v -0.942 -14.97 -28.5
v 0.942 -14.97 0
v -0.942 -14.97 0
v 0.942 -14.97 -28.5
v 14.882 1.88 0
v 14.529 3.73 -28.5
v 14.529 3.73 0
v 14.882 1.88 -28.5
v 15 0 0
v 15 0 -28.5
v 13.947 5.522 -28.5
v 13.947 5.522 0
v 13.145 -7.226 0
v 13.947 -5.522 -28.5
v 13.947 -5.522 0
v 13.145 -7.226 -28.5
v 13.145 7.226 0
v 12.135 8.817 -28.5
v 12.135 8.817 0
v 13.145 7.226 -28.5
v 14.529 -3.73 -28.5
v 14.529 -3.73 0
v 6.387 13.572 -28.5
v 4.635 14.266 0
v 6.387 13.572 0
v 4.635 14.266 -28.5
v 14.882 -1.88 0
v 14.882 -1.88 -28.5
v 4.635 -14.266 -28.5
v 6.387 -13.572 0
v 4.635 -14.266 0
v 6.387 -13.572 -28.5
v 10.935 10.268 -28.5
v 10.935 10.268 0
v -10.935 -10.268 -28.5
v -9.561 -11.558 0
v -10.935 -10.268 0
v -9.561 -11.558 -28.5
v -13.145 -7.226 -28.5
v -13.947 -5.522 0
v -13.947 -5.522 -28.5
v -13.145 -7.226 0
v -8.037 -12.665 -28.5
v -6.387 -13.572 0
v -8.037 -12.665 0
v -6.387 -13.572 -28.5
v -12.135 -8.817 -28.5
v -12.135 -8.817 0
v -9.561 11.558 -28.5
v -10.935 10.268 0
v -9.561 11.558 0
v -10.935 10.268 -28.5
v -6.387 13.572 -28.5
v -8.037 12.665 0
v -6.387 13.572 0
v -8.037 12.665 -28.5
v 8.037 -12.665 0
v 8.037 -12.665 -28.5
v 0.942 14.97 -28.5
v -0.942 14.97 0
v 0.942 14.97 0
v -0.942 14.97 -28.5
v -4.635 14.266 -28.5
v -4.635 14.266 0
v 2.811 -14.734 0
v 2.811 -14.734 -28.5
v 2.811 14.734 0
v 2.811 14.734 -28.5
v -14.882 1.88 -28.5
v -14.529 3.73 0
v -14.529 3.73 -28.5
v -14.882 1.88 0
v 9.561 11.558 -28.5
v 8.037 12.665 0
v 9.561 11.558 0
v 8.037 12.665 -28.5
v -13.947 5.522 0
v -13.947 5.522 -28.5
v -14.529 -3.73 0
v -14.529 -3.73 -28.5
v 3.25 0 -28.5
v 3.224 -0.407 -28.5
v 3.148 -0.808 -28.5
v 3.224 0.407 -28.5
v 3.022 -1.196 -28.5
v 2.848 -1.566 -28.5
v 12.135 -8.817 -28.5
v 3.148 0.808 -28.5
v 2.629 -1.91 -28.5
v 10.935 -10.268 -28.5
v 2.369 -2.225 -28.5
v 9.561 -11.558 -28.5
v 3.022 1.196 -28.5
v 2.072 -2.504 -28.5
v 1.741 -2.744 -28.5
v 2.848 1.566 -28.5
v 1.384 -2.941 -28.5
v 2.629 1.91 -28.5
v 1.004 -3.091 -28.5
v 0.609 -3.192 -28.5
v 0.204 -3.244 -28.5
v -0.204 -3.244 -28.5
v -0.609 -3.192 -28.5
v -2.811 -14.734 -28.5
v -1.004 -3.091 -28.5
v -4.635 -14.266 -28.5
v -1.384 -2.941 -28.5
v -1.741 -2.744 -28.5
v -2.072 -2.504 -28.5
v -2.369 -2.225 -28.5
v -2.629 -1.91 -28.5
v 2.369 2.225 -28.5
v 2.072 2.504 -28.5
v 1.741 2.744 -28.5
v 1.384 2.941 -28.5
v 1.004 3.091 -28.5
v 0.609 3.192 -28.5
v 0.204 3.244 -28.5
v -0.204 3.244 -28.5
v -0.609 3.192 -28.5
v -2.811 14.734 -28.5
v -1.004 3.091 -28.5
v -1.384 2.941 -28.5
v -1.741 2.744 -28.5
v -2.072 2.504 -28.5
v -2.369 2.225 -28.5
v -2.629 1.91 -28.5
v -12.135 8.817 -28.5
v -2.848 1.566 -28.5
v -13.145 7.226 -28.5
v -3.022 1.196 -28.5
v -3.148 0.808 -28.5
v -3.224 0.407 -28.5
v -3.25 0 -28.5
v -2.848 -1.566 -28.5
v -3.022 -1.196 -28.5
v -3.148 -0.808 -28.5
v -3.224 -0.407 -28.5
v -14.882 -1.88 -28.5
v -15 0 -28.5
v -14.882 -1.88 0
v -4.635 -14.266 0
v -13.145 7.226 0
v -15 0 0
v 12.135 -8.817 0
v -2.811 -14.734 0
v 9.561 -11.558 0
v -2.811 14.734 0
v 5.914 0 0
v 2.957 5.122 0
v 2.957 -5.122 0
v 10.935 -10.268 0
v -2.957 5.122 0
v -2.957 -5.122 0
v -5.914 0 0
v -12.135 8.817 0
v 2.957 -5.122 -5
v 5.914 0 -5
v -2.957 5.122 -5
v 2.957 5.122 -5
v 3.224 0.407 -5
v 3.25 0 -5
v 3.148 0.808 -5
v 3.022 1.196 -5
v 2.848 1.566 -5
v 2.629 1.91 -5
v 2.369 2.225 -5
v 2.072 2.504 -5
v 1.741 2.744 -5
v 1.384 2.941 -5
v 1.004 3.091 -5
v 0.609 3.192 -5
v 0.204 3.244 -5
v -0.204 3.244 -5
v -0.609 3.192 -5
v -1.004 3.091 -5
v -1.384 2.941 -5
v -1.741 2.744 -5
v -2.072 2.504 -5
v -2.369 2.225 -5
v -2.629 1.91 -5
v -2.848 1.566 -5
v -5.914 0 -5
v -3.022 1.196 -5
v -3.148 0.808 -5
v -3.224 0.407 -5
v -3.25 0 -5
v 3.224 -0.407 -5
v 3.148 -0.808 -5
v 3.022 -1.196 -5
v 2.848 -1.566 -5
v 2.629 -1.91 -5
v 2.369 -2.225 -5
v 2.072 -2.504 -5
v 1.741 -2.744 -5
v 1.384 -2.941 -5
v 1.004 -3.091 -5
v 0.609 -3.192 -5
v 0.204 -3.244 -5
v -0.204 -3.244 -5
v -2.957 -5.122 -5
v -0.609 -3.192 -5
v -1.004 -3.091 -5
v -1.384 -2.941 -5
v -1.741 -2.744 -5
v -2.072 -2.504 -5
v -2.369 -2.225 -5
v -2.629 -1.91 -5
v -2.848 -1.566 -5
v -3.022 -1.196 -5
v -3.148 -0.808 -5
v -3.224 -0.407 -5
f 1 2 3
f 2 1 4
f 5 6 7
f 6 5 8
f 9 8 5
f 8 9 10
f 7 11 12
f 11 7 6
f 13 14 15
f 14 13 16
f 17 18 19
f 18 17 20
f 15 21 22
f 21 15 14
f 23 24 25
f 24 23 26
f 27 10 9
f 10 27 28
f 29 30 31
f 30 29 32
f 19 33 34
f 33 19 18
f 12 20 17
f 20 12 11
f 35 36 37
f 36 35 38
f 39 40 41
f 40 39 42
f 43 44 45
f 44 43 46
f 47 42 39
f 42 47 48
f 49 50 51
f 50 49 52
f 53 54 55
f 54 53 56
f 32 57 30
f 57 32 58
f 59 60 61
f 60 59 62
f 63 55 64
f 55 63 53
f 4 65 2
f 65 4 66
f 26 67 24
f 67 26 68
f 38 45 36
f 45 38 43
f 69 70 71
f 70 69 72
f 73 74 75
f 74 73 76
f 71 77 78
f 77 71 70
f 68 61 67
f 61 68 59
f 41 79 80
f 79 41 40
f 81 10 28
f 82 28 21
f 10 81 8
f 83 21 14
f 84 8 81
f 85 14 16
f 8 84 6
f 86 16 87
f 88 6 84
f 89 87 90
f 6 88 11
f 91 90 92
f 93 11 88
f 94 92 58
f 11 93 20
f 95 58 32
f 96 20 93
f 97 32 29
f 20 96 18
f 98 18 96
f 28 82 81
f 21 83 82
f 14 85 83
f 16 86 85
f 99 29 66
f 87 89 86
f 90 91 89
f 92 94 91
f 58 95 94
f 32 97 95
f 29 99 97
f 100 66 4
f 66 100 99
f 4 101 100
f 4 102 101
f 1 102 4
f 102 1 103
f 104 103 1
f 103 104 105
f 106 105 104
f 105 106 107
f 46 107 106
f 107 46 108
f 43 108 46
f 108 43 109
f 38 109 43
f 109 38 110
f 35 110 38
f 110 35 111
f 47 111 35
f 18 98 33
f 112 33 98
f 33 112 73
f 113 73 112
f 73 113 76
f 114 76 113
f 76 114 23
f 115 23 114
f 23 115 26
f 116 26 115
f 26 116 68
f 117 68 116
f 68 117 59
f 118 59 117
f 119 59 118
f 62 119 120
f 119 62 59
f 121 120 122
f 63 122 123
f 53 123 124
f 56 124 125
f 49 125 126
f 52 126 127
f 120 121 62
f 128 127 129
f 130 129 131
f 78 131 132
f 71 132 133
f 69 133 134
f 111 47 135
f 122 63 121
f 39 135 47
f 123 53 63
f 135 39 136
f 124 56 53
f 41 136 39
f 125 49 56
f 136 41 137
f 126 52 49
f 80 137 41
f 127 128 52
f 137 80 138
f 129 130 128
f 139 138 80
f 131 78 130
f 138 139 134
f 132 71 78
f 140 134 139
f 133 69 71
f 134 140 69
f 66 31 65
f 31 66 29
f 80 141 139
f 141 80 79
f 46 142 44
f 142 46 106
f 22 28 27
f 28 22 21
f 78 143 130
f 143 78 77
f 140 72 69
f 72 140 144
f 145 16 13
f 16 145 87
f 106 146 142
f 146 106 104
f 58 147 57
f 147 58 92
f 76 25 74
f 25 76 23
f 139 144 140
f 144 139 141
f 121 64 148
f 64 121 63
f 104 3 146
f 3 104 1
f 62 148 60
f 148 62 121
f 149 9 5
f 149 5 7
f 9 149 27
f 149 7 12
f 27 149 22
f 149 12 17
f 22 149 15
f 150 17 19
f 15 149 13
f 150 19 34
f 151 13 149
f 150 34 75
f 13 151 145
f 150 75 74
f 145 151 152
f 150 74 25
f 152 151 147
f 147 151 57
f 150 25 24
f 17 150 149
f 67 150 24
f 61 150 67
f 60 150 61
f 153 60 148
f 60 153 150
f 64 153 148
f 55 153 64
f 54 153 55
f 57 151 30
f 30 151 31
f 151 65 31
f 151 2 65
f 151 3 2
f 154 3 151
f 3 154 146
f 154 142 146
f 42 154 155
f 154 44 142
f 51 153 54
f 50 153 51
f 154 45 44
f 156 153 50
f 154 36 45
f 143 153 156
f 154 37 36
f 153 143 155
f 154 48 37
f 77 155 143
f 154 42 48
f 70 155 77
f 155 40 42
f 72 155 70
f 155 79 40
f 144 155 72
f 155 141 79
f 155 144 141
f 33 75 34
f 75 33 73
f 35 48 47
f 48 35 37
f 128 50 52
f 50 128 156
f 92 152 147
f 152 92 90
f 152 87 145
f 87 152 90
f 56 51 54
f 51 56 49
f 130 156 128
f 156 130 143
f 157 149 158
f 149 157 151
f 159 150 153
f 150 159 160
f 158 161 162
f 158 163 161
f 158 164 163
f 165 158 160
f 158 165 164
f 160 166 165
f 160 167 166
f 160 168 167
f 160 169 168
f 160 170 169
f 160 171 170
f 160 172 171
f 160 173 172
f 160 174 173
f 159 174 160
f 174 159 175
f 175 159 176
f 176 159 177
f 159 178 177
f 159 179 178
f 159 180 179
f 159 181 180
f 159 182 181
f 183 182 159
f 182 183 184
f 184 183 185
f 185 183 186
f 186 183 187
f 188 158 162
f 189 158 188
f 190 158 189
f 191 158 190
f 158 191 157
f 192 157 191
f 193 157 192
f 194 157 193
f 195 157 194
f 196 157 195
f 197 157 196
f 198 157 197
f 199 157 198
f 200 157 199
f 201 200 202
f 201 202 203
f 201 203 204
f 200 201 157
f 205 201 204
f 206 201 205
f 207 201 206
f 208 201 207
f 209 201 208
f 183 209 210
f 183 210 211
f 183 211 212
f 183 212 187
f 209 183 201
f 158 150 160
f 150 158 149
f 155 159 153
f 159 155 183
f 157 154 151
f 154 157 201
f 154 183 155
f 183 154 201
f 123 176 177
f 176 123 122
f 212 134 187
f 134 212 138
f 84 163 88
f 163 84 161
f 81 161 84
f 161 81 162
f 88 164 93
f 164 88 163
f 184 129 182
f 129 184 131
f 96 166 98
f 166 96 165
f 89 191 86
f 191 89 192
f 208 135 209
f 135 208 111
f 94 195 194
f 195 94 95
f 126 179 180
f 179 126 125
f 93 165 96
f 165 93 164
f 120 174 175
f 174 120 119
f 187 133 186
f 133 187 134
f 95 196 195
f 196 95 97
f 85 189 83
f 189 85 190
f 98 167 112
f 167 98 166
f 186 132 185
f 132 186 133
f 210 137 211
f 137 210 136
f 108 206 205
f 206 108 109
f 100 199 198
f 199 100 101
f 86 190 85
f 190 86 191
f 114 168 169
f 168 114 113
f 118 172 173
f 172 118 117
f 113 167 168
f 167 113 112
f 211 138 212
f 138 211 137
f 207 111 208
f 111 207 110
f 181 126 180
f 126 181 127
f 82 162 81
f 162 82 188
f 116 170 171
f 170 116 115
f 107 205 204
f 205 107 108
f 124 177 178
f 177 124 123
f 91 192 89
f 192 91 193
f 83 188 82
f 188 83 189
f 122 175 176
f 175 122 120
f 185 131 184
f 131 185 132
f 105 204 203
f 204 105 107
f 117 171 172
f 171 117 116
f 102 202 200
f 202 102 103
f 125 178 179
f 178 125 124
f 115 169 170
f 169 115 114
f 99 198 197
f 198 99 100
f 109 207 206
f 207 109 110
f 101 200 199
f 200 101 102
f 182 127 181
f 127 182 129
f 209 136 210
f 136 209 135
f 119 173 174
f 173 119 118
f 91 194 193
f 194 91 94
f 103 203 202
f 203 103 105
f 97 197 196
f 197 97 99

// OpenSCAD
$fn = 50;


difference() {
	union() {
		translate(v = [0, 0, -28.5000000000]) {
			cylinder(h = 28.5000000000, r = 15.0000000000);
		}
		#translate(v = [0, 0, -30.0000000000]) {
			cylinder(h = 30, r = 2.8750000000);
		}
	}
	union() {
		translate(v = [0, 0, 0]) {
			rotate(a = [0, 0, 0]) {
				difference() {
					union() {
						translate(v = [0, 0, -5]) {
							linear_extrude(height = 5) {
								polygon(points = [[5.9142500000, 0.0000000000], [2.9571250000, 5.1218907443], [-2.9571250000, 5.1218907443], [-5.9142500000, 0.0000000000], [-2.9571250000, -5.1218907443], [2.9571250000, -5.1218907443]]);
							}
						}
					}
					union();
				}
			}
		}
		#translate(v = [0, 0, -100.0000000000]) {
			cylinder(h = 200, r = 3.2500000000);
		}
	}
}
